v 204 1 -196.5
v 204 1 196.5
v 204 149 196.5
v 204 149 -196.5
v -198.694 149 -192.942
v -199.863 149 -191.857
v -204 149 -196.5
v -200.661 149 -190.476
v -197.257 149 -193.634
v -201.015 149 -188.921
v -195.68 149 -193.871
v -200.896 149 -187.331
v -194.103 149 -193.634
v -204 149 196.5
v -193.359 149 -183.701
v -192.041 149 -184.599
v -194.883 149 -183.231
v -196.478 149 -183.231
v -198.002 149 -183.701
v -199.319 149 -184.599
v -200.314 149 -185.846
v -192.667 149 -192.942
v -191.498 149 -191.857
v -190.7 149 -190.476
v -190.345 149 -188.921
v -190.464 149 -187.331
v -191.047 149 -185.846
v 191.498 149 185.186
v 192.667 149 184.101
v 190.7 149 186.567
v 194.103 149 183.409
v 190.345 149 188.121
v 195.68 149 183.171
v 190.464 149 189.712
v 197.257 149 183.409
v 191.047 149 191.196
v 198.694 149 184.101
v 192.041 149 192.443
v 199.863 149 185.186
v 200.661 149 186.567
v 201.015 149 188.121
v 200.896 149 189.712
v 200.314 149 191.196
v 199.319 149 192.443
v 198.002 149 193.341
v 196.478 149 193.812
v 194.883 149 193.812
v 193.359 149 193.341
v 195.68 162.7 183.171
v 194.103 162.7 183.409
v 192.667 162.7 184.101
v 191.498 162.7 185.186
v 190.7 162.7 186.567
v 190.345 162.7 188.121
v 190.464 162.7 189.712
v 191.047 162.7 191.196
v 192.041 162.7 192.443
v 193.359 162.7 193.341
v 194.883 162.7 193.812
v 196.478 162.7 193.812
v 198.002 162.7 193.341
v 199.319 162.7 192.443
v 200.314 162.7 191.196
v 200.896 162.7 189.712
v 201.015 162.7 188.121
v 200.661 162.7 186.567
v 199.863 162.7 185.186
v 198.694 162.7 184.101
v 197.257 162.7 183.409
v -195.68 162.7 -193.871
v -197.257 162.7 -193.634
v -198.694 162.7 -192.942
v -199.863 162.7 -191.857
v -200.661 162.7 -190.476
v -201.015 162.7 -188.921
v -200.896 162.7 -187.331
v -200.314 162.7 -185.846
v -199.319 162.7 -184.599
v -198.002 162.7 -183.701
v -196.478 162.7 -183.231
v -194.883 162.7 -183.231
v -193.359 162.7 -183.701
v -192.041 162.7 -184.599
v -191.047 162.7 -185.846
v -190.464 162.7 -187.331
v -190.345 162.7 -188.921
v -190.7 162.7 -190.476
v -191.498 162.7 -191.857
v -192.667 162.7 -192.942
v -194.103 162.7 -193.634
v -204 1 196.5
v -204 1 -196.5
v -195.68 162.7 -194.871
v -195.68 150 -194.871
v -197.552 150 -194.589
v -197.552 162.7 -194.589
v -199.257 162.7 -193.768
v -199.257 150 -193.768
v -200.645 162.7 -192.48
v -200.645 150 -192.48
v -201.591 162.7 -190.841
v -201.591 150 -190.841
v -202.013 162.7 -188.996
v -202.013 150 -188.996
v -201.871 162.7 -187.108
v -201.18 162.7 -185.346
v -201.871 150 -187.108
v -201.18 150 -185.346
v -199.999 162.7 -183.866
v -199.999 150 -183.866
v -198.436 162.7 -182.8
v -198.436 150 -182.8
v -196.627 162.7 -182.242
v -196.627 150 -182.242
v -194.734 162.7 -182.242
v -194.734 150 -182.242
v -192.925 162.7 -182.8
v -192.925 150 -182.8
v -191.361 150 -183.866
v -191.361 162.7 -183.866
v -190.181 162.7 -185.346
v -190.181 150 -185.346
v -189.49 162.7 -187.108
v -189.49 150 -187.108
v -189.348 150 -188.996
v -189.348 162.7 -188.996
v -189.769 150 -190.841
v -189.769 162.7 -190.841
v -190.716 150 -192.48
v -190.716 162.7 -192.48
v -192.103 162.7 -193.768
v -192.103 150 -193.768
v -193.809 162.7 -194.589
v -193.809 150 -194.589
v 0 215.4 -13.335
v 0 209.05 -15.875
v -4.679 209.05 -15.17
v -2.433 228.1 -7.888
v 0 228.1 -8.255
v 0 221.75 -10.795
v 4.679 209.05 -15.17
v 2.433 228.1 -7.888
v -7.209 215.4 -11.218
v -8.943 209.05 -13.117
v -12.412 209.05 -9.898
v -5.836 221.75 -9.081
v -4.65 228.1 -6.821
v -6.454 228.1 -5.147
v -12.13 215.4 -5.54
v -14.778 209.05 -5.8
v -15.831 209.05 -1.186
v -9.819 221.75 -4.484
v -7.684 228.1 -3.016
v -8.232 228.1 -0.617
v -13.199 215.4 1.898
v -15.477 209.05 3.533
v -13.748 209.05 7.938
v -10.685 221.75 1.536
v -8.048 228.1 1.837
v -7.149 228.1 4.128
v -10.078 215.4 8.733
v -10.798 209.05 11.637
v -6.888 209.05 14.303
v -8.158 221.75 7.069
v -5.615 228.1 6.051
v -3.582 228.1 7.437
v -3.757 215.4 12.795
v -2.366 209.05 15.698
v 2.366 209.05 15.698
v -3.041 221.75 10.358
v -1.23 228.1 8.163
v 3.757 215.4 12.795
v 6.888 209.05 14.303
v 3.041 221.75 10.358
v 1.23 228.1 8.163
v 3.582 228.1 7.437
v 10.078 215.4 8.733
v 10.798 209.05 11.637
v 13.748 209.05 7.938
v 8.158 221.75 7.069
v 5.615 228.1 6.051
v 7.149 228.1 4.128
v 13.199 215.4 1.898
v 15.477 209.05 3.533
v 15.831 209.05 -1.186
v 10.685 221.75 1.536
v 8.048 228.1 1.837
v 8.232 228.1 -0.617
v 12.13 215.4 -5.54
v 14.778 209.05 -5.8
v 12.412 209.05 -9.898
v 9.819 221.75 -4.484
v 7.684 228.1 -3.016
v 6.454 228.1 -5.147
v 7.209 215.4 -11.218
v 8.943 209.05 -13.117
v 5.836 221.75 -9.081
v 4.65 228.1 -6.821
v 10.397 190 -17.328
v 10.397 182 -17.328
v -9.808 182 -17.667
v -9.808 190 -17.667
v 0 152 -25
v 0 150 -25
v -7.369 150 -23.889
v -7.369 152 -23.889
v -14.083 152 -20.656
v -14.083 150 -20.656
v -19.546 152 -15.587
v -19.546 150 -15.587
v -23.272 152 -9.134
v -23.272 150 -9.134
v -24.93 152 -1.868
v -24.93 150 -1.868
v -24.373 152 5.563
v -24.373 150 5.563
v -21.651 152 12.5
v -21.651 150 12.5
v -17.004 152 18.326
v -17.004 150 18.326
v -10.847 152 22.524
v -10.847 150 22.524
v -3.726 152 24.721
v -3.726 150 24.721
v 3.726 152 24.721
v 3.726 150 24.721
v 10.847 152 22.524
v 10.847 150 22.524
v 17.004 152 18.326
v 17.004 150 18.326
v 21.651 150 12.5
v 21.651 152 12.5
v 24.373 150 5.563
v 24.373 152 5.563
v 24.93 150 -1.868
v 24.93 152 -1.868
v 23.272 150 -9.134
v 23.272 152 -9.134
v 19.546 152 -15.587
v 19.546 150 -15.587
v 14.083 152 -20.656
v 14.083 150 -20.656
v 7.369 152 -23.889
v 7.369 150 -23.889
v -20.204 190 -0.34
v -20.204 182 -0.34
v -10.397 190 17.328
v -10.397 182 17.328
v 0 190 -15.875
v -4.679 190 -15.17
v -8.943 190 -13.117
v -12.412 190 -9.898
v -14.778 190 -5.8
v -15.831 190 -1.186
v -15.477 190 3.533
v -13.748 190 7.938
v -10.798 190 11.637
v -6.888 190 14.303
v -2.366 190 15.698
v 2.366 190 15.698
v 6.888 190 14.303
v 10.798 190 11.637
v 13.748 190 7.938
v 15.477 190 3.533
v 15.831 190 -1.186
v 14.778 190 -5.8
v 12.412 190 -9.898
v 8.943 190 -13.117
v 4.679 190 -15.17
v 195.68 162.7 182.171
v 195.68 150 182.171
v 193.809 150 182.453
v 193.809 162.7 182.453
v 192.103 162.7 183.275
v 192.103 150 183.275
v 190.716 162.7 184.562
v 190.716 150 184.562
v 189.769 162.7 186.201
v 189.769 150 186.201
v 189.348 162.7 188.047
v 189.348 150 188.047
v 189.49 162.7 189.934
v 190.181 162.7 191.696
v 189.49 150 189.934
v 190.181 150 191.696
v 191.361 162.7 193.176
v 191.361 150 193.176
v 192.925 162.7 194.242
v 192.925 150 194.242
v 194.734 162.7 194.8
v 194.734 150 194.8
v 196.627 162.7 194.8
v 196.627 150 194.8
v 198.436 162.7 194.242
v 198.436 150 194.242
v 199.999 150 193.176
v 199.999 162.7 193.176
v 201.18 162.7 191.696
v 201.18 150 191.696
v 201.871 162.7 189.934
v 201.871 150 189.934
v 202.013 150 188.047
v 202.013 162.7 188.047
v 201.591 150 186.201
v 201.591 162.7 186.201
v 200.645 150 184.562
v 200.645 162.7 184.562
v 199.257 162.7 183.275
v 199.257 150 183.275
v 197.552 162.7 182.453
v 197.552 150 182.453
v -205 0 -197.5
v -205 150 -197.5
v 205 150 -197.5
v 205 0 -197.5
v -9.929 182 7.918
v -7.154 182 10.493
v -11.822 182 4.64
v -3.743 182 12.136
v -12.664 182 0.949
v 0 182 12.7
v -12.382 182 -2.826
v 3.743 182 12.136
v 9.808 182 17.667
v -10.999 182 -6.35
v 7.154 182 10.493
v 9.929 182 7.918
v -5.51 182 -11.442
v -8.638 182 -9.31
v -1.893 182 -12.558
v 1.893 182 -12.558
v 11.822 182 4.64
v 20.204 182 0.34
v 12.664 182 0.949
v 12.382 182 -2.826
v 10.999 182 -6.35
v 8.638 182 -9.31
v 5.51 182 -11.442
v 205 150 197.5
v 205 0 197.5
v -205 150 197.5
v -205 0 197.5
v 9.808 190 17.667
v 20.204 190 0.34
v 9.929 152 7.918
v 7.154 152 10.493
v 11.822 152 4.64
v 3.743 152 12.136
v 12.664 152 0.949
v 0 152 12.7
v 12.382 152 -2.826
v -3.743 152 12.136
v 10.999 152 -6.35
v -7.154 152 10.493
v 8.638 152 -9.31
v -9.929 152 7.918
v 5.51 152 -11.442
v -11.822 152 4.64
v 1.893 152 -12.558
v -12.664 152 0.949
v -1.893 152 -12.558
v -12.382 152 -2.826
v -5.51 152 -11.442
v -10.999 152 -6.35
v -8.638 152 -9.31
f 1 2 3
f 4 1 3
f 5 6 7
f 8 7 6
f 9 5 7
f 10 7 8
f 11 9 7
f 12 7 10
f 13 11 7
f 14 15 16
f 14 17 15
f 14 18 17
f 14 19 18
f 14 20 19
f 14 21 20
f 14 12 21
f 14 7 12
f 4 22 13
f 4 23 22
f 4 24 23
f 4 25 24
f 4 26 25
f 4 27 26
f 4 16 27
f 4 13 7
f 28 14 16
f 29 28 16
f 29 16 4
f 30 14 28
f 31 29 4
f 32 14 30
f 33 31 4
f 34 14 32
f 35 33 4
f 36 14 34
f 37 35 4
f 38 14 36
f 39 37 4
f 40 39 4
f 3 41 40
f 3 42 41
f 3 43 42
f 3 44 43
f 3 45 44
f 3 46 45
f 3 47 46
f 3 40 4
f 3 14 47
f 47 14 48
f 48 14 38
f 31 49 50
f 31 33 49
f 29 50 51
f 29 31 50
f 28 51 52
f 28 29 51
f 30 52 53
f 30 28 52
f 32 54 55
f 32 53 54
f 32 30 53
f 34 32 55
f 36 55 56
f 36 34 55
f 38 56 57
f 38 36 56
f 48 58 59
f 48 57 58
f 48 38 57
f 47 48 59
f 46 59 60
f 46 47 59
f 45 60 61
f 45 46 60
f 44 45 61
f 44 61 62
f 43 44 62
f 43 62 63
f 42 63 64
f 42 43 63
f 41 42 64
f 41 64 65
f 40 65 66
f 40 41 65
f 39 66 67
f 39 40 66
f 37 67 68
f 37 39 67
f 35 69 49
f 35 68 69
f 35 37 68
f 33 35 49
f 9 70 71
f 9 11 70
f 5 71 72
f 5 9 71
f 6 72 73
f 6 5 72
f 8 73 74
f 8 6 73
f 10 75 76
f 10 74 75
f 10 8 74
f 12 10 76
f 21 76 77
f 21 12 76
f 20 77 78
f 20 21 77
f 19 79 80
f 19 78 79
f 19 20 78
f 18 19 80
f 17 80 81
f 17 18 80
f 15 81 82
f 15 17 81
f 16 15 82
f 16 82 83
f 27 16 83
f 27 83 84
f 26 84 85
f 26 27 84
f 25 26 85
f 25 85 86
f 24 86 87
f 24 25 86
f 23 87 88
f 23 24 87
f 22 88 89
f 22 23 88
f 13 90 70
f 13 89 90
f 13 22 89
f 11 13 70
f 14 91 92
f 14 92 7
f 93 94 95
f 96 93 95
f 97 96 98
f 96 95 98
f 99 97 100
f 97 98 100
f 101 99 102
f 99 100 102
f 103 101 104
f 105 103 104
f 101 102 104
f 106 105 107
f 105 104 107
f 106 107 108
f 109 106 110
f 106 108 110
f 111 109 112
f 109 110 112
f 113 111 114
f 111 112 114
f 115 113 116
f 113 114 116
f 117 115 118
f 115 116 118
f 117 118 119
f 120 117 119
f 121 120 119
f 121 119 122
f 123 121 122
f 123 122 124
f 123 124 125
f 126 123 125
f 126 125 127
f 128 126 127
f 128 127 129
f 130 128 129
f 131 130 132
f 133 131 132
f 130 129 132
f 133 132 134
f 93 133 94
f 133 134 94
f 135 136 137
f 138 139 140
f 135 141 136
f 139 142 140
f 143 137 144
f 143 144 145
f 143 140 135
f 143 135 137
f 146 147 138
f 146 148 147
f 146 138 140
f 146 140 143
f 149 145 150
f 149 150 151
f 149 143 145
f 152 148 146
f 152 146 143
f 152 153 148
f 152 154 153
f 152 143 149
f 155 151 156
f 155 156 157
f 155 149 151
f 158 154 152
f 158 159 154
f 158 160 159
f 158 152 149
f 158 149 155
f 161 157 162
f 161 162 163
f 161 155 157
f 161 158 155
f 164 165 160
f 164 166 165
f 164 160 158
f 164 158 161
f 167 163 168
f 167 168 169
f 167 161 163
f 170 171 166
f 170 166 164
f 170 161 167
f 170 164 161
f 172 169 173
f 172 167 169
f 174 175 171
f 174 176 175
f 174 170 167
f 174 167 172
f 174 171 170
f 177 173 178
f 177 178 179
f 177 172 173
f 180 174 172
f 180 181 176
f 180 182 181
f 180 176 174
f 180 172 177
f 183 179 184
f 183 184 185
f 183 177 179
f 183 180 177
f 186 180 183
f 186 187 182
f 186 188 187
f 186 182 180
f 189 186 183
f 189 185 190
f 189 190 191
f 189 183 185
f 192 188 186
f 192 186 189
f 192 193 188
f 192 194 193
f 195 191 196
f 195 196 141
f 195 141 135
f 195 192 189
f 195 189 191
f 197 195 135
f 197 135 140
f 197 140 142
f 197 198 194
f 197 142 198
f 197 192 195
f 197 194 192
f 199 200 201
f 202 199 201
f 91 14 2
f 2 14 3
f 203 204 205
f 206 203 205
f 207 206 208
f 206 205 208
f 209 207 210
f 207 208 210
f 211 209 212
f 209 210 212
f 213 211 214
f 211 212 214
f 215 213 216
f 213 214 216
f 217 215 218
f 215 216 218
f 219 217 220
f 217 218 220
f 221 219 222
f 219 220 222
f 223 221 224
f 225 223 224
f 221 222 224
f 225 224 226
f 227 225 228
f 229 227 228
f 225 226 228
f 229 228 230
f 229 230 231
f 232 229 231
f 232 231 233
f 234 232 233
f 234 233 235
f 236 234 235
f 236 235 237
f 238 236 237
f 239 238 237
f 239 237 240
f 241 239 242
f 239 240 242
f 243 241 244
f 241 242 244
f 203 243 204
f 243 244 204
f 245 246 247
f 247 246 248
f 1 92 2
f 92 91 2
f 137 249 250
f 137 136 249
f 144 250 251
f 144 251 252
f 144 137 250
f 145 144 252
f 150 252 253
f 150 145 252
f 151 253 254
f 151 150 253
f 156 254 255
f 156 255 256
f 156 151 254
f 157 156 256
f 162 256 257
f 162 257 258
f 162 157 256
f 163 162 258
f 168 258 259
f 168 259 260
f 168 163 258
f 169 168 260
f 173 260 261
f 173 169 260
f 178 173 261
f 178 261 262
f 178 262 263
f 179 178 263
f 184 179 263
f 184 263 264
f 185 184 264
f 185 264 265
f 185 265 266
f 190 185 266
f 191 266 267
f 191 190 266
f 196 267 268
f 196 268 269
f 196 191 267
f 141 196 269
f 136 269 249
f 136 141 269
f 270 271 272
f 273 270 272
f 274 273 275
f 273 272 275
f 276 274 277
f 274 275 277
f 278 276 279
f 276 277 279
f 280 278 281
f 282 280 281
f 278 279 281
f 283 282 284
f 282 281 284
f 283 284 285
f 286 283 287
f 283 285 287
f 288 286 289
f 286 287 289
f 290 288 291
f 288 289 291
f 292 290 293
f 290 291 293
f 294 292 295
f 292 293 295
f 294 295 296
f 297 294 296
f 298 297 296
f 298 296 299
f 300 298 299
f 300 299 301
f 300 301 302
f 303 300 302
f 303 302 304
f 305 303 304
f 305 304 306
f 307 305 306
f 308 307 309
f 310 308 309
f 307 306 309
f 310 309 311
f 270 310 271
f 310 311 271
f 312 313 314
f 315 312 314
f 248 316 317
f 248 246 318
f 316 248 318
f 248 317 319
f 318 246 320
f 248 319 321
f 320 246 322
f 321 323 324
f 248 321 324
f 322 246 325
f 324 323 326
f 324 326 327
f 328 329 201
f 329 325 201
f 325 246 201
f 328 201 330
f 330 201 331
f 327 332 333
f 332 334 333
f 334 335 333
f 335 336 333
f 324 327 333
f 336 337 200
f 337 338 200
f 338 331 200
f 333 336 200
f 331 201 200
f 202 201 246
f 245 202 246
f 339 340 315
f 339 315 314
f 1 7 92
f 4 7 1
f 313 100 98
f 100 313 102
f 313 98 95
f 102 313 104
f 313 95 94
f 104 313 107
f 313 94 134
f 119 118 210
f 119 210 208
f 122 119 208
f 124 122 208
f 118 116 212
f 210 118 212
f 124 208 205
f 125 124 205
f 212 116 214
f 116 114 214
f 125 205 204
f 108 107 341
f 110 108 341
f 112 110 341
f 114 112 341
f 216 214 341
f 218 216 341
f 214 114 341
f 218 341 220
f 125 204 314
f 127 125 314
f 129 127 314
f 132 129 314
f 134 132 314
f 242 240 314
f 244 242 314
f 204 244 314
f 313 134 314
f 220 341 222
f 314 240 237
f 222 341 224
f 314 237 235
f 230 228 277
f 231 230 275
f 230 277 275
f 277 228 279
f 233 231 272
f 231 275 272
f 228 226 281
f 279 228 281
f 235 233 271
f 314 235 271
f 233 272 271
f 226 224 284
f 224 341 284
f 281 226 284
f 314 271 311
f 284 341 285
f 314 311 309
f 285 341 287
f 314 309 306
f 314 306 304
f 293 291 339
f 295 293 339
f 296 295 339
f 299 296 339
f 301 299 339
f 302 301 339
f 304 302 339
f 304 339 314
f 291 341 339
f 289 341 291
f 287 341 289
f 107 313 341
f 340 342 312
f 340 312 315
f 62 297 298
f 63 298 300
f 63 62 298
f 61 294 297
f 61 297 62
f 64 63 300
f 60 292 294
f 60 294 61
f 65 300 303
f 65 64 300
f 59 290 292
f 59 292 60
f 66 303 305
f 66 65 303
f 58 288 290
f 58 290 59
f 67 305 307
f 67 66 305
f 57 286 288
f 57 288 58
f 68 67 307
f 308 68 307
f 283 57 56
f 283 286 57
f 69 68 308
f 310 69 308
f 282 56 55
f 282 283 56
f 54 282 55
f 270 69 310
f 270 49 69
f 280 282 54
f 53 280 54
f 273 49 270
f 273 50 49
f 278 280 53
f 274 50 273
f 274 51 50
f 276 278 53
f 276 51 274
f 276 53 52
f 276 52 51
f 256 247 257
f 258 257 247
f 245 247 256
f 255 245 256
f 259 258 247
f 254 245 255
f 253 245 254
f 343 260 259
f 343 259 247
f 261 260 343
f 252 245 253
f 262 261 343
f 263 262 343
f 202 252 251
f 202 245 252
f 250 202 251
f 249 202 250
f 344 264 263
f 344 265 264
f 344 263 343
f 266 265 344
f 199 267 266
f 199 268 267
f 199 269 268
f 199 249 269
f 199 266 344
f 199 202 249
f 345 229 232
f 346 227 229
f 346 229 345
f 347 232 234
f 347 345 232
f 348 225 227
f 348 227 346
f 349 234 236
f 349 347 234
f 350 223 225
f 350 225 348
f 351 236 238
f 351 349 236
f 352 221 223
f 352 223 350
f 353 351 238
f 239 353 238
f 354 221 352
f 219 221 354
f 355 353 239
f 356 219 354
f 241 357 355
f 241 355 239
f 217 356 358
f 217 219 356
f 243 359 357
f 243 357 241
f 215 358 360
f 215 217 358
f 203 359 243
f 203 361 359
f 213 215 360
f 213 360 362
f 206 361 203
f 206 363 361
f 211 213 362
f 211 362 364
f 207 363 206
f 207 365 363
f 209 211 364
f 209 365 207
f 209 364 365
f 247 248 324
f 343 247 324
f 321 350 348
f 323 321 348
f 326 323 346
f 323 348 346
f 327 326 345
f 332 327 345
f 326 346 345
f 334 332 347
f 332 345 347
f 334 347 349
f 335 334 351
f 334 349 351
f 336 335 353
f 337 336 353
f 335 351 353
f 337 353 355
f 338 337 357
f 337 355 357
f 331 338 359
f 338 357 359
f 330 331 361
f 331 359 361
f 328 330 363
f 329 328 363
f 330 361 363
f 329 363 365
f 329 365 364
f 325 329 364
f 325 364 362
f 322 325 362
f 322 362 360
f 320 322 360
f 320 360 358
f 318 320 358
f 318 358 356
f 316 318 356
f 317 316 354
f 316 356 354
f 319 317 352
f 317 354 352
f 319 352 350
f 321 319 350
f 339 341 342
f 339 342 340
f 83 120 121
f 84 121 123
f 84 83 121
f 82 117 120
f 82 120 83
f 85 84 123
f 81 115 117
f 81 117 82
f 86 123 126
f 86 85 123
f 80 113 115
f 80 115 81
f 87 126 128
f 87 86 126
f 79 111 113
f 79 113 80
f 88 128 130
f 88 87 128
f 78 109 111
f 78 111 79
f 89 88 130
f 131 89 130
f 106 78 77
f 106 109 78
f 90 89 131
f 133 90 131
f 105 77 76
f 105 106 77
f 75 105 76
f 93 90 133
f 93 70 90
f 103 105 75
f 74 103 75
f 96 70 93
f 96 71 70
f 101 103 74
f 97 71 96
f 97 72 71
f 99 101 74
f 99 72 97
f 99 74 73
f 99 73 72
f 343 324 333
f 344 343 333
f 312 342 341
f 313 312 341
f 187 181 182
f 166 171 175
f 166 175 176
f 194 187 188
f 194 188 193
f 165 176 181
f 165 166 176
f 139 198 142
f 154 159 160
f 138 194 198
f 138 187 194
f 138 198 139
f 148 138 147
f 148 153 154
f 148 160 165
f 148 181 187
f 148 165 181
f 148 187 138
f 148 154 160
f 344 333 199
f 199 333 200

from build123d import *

# Parameters (mm, degrees)
SKETCH1_W      = 410
SKETCH1_H      = 150
EXTRUDE1_DEPTH = 197.5
SKETCH2_R      = 6.35
EXTRUDE2_DEPTH = 12.7
SHELL1_T       = -1
SKETCH3_R      = 25
EXTRUDE3_DEPTH = 2
SKETCH4_R      = 12.7
EXTRUDE4_DEPTH = 30
EXTRUDE5_DEPTH = 8


with BuildPart() as part:
    # Sketch1 → Extrude1 (new, symmetric)
    with BuildSketch(Plane.XY):
        with Locations((0, 75)):
            Rectangle(SKETCH1_W, SKETCH1_H)
    extrude(amount=EXTRUDE1_DEPTH, both=True)

    # Sketch2 → Extrude2 (add)
    with BuildSketch(Plane(origin=(0, 150, 0), x_dir=(1, 0, 0), z_dir=(0, 1, 0))):
        with Locations(Location((-195.680339288, 188.521302485, 0), (0, 0, 90))):
            Circle(SKETCH2_R)
        with Locations(Location((195.680339288, -188.521302485, 0), (0, 0, 90))):
            Circle(SKETCH2_R)
    extrude(amount=EXTRUDE2_DEPTH)

    # Shell1
    shell1_openings = [part.faces().sort_by_distance(p)[0] for p in [
        (-195.680339288, 162.7, -188.521302485),
        (195.680339288, 162.7, 188.521302485),
    ]]
    offset(amount=SHELL1_T, openings=shell1_openings, kind=Kind.INTERSECTION)

    # Sketch3 → Extrude3 (add)
    with BuildSketch(Plane(origin=(0, 150, 0), x_dir=(1, 0, 0), z_dir=(0, 1, 0))):
        with Locations(Location((0, 0, 0), (0, 0, 90))):
            Circle(SKETCH3_R)
    extrude(amount=EXTRUDE3_DEPTH)

    # Sketch4 → Extrude4 (add)
    with BuildSketch(Plane(origin=(0, 152, 0), x_dir=(1, 0, 0), z_dir=(0, 1, 0))):
        with Locations(Location((0, 0, 0), (0, 0, 270))):
            Circle(SKETCH4_R)
    extrude(amount=EXTRUDE4_DEPTH)

    # Sketch5 → Extrude5 (add)
    with BuildSketch(Plane(origin=(0, 182, 0), x_dir=(1, 0, 0), z_dir=(0, 1, 0))):
        Polygon((10.396549201, 17.327582002), (-9.807851599, 17.667466721), (-20.204400801, 0.339884719), (-10.396549201, -17.327582002), (9.807851599, -17.667466721), (20.204400801, -0.339884719), align=None)
    extrude(amount=EXTRUDE5_DEPTH)

    # Sketch6 → Revolve1 (revolve)
    with BuildSketch(Plane.XY, mode=Mode.PRIVATE) as revolve1_sk:
        Polygon((0, 190), (15.875, 190), (15.875, 209.05), (8.255, 228.1), (0, 228.1), align=None)
    revolve(revolve1_sk.sketch.rotate(Axis((0, 0, 0), (0, 1, 0)), 90), axis=Axis((0, 0, 0), (0, 1, 0)))


solid = part.part
